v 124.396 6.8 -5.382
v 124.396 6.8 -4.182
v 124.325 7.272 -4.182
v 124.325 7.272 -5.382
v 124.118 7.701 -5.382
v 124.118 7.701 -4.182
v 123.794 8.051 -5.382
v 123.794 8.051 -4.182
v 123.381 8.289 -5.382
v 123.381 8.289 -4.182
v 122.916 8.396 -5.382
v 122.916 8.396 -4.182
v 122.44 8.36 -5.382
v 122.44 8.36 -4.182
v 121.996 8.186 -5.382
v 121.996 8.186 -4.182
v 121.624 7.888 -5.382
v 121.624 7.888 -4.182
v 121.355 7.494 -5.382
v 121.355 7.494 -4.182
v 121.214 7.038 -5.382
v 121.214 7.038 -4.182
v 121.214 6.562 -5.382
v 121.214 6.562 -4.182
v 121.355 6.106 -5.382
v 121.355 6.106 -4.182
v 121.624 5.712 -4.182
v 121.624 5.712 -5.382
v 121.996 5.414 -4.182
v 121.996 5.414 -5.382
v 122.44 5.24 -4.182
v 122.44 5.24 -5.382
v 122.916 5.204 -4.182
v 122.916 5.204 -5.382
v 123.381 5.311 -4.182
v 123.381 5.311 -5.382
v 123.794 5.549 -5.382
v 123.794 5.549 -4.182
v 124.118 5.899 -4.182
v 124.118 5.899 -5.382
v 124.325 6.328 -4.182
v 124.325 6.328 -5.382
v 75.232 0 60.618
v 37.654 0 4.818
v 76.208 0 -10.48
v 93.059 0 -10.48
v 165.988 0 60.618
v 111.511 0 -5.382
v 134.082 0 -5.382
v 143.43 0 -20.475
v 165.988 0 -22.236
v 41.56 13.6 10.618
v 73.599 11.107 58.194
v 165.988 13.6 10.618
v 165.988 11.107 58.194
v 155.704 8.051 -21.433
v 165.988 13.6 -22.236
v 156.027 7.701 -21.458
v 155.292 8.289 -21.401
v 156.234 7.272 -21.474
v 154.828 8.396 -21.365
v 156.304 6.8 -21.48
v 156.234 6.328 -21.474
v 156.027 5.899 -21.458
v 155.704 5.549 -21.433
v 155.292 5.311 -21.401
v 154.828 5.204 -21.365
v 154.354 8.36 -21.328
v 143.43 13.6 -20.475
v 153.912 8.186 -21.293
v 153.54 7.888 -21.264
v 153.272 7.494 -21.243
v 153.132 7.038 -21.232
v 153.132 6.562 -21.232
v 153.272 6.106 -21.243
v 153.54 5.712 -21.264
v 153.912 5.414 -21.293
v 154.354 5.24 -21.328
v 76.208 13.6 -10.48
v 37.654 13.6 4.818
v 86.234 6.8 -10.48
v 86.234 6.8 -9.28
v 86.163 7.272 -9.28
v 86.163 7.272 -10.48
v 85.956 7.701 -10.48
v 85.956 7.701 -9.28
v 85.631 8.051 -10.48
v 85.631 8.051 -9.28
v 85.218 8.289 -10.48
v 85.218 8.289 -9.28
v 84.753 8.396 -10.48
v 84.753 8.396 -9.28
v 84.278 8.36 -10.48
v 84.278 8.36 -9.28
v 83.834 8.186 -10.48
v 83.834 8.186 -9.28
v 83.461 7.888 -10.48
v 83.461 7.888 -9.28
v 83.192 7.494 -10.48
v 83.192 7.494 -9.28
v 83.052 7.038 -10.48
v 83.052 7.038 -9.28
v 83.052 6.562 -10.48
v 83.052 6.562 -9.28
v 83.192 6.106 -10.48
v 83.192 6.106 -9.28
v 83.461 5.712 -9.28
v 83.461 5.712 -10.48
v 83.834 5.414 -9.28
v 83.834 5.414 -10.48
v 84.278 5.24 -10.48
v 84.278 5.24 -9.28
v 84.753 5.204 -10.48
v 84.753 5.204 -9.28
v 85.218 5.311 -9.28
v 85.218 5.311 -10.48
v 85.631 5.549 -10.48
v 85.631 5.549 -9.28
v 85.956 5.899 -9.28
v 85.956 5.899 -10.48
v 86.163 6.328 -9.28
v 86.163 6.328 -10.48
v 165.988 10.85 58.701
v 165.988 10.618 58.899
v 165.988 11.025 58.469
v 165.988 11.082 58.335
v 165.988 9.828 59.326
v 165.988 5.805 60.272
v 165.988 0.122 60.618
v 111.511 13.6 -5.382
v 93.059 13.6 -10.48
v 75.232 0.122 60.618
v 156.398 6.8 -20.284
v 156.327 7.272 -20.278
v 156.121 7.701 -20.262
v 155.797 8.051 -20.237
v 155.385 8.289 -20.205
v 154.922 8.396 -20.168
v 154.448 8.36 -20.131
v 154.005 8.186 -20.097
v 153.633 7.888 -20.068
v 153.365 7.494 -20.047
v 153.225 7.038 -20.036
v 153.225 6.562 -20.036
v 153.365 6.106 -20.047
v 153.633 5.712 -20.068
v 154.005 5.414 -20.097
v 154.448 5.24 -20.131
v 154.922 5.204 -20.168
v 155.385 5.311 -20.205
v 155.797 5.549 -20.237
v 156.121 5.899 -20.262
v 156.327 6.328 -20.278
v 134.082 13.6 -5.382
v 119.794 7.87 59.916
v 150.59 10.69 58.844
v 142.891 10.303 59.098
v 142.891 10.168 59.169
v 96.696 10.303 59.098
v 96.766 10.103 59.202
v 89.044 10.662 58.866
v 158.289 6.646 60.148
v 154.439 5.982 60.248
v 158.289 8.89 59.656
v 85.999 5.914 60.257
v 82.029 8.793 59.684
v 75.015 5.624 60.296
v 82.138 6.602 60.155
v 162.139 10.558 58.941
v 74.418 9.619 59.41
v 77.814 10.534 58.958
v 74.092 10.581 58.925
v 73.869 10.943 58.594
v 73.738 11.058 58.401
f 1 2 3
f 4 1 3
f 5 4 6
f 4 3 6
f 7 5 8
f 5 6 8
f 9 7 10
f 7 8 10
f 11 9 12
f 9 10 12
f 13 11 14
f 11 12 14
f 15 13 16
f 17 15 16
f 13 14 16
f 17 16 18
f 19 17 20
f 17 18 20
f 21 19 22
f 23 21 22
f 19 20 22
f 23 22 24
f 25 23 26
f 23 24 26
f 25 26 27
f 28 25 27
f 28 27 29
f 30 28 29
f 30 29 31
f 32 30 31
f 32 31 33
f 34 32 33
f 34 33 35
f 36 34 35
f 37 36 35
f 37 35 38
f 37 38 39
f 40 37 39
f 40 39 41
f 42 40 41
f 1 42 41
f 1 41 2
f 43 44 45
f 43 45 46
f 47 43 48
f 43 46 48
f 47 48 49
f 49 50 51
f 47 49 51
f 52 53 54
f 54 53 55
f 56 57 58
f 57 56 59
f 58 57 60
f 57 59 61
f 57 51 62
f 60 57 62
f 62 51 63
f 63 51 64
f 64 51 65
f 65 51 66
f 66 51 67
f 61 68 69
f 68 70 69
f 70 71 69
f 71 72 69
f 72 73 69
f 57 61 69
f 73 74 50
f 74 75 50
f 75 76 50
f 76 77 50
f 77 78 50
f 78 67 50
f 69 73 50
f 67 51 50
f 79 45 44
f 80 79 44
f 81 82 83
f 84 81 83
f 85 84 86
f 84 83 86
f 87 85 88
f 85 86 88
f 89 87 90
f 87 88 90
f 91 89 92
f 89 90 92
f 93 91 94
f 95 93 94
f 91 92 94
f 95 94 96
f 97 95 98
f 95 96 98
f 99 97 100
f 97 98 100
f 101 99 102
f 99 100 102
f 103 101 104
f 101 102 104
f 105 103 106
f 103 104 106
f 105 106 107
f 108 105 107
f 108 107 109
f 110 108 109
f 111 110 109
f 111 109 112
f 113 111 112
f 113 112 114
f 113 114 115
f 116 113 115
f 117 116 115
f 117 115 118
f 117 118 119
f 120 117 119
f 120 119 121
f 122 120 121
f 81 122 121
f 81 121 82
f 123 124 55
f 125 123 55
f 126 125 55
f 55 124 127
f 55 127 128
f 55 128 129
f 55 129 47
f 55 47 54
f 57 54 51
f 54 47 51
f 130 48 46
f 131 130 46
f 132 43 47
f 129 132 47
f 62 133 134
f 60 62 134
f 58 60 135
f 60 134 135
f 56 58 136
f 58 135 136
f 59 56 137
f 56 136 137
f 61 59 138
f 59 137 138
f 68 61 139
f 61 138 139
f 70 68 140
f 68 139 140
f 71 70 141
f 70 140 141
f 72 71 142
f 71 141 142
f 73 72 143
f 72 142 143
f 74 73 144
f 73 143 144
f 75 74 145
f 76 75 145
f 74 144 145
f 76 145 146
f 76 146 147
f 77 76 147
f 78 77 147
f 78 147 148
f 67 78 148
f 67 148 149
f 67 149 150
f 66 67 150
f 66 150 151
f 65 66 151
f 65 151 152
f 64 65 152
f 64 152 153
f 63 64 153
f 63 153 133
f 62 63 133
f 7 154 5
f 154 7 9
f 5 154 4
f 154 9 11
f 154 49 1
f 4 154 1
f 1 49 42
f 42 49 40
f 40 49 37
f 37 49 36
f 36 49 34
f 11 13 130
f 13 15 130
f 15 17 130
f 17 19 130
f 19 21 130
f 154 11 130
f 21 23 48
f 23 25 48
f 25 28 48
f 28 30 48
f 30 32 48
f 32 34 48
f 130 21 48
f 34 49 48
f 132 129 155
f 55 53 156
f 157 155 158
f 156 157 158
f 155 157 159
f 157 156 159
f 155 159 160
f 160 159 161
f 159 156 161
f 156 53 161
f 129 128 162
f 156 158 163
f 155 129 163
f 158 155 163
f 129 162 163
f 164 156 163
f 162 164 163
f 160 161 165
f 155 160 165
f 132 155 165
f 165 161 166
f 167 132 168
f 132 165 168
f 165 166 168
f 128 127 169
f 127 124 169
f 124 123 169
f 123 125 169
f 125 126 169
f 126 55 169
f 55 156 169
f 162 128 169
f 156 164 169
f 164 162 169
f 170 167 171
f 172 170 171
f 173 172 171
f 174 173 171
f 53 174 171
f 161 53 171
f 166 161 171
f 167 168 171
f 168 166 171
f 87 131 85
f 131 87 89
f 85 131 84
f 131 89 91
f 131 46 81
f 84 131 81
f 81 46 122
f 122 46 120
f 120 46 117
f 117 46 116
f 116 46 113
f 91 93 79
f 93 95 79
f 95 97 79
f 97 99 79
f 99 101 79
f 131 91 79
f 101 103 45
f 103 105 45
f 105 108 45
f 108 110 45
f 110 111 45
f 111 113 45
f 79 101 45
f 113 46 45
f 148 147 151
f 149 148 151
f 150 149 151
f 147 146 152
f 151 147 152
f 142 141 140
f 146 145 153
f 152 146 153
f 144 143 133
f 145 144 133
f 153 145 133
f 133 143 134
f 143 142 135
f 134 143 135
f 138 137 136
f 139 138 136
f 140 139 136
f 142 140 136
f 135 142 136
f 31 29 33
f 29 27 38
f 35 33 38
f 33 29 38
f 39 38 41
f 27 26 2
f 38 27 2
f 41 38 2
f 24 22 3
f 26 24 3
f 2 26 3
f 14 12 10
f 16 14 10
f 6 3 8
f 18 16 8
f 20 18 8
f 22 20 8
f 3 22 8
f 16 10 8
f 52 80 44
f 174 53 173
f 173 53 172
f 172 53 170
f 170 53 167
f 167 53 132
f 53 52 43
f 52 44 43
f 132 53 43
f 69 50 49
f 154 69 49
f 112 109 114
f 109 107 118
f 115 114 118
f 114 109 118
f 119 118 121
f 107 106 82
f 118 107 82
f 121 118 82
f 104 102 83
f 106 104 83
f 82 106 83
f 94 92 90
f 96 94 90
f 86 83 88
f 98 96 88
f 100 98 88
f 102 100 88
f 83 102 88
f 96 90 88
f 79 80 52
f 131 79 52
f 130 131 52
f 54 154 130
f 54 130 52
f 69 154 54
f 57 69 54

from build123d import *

# Parameters (mm, degrees)
BOSS_EXTRUDE1_DEPTH       = 13.6
BOSS_EXTRUDE2_DEPTH       = 13.6
CHAMFER1_SIZE             = 50
CHAMFER1_SIZE2            = 2.620388964
F_3_0MM_DOWEL_HOLE1_D     = 3.2
F_3_0MM_DOWEL_HOLE1_DEPTH = 1.2
F_3_0MM_DOWEL_HOLE2_D     = 3.2
F_3_0MM_DOWEL_HOLE2_DEPTH = 1.2
F_3_0MM_DOWEL_HOLE3_D     = 3.2
F_3_0MM_DOWEL_HOLE3_DEPTH = 1.2


with BuildPart() as part:
    # wrist → Boss-Extrude1 (new body)
    with BuildSketch(Plane(origin=(0, 0, 0), x_dir=(1, 0, 0), z_dir=(0, 1, 0))):
        Polygon((165.988080985, -4.817824349), (165.988080985, 22.235679058), (143.430369308, 20.475150048), (134.081949487, 5.381860359), (111.510829699, 5.381860359), (93.059430407, 10.480109343), (76.207852469, 10.480109343), (37.653795388, -4.817824349), align=None)
    extrude(amount=BOSS_EXTRUDE1_DEPTH)

    # wrist<5> → Boss-Extrude2 (add)
    with BuildSketch(Plane(origin=(0, 0, 0), x_dir=(1, 0, 0), z_dir=(0, 1, 0))):
        Polygon((165.988080985, -60.618139641), (165.988080985, -4.817824349), (37.653795388, -4.817824349), (75.231684079, -60.618139641), align=None)
    extrude(amount=BOSS_EXTRUDE2_DEPTH)

    # Chamfer1
    chamfer1_edges = [part.edges().sort_by_distance(p)[0] for p in [
        (120.609882532, 13.6, 60.618139641),
    ]]
    chamfer1_side = [part.faces().sort_by_distance(p)[0] for p in [
        (112.052751193, 13.6, 23.244648168),
    ]]
    chamfer(chamfer1_edges, length=CHAMFER1_SIZE, length2=CHAMFER1_SIZE2, reference=chamfer1_side[0])

    # Fillet1
    # an asymmetric fillet: 11, 3 mm, written as the material it takes off along each edge
    with BuildSketch(Plane(origin=(48.087002909, 10.979611036, 60.618139641), x_dir=(0, 0.05233595624294356, -0.9986295347545739), z_dir=(1, 0, 0))) as fillet1_piece_1:
        with BuildLine():
            Bezier((2.427631466, 0), (0, 0), (-0.568257138, -10.842992131), weights=[1, 0.725374371, 1])
            Line((-0.568257138, -10.842992131), (0, 0))
            Line((0, 0), (2.427631466, 0))
        make_face()
    extrude(amount=145.045759247, mode=Mode.SUBTRACT)

    # Ø3.0mm Dowel Hole1
    with Locations(Plane(origin=(-0.719959147, 0, -9.224858415), x_dir=(-0.9969682889311796, 0, 0.07780893821172487), z_dir=(-0.07780893821172487, 0, -0.9969682889311796))):
        with Locations((-155.901833608, 6.8)):
            Hole(F_3_0MM_DOWEL_HOLE1_D / 2, depth=F_3_0MM_DOWEL_HOLE1_DEPTH)

    # Ø3.0mm Dowel Hole2
    with Locations(Plane(origin=(0, 0, -5.381860359), x_dir=(-1, 0, 0), z_dir=(0, 0, -1))):
        with Locations((-122.796389593, 6.8)):
            Hole(F_3_0MM_DOWEL_HOLE2_D / 2, depth=F_3_0MM_DOWEL_HOLE2_DEPTH)

    # Ø3.0mm Dowel Hole3
    with Locations(Plane(origin=(0, 0, -10.480109343), x_dir=(-1, 0, 0), z_dir=(0, 0, -1))):
        with Locations((-84.633641438, 6.8)):
            Hole(F_3_0MM_DOWEL_HOLE3_D / 2, depth=F_3_0MM_DOWEL_HOLE3_DEPTH)


solid = part.part
